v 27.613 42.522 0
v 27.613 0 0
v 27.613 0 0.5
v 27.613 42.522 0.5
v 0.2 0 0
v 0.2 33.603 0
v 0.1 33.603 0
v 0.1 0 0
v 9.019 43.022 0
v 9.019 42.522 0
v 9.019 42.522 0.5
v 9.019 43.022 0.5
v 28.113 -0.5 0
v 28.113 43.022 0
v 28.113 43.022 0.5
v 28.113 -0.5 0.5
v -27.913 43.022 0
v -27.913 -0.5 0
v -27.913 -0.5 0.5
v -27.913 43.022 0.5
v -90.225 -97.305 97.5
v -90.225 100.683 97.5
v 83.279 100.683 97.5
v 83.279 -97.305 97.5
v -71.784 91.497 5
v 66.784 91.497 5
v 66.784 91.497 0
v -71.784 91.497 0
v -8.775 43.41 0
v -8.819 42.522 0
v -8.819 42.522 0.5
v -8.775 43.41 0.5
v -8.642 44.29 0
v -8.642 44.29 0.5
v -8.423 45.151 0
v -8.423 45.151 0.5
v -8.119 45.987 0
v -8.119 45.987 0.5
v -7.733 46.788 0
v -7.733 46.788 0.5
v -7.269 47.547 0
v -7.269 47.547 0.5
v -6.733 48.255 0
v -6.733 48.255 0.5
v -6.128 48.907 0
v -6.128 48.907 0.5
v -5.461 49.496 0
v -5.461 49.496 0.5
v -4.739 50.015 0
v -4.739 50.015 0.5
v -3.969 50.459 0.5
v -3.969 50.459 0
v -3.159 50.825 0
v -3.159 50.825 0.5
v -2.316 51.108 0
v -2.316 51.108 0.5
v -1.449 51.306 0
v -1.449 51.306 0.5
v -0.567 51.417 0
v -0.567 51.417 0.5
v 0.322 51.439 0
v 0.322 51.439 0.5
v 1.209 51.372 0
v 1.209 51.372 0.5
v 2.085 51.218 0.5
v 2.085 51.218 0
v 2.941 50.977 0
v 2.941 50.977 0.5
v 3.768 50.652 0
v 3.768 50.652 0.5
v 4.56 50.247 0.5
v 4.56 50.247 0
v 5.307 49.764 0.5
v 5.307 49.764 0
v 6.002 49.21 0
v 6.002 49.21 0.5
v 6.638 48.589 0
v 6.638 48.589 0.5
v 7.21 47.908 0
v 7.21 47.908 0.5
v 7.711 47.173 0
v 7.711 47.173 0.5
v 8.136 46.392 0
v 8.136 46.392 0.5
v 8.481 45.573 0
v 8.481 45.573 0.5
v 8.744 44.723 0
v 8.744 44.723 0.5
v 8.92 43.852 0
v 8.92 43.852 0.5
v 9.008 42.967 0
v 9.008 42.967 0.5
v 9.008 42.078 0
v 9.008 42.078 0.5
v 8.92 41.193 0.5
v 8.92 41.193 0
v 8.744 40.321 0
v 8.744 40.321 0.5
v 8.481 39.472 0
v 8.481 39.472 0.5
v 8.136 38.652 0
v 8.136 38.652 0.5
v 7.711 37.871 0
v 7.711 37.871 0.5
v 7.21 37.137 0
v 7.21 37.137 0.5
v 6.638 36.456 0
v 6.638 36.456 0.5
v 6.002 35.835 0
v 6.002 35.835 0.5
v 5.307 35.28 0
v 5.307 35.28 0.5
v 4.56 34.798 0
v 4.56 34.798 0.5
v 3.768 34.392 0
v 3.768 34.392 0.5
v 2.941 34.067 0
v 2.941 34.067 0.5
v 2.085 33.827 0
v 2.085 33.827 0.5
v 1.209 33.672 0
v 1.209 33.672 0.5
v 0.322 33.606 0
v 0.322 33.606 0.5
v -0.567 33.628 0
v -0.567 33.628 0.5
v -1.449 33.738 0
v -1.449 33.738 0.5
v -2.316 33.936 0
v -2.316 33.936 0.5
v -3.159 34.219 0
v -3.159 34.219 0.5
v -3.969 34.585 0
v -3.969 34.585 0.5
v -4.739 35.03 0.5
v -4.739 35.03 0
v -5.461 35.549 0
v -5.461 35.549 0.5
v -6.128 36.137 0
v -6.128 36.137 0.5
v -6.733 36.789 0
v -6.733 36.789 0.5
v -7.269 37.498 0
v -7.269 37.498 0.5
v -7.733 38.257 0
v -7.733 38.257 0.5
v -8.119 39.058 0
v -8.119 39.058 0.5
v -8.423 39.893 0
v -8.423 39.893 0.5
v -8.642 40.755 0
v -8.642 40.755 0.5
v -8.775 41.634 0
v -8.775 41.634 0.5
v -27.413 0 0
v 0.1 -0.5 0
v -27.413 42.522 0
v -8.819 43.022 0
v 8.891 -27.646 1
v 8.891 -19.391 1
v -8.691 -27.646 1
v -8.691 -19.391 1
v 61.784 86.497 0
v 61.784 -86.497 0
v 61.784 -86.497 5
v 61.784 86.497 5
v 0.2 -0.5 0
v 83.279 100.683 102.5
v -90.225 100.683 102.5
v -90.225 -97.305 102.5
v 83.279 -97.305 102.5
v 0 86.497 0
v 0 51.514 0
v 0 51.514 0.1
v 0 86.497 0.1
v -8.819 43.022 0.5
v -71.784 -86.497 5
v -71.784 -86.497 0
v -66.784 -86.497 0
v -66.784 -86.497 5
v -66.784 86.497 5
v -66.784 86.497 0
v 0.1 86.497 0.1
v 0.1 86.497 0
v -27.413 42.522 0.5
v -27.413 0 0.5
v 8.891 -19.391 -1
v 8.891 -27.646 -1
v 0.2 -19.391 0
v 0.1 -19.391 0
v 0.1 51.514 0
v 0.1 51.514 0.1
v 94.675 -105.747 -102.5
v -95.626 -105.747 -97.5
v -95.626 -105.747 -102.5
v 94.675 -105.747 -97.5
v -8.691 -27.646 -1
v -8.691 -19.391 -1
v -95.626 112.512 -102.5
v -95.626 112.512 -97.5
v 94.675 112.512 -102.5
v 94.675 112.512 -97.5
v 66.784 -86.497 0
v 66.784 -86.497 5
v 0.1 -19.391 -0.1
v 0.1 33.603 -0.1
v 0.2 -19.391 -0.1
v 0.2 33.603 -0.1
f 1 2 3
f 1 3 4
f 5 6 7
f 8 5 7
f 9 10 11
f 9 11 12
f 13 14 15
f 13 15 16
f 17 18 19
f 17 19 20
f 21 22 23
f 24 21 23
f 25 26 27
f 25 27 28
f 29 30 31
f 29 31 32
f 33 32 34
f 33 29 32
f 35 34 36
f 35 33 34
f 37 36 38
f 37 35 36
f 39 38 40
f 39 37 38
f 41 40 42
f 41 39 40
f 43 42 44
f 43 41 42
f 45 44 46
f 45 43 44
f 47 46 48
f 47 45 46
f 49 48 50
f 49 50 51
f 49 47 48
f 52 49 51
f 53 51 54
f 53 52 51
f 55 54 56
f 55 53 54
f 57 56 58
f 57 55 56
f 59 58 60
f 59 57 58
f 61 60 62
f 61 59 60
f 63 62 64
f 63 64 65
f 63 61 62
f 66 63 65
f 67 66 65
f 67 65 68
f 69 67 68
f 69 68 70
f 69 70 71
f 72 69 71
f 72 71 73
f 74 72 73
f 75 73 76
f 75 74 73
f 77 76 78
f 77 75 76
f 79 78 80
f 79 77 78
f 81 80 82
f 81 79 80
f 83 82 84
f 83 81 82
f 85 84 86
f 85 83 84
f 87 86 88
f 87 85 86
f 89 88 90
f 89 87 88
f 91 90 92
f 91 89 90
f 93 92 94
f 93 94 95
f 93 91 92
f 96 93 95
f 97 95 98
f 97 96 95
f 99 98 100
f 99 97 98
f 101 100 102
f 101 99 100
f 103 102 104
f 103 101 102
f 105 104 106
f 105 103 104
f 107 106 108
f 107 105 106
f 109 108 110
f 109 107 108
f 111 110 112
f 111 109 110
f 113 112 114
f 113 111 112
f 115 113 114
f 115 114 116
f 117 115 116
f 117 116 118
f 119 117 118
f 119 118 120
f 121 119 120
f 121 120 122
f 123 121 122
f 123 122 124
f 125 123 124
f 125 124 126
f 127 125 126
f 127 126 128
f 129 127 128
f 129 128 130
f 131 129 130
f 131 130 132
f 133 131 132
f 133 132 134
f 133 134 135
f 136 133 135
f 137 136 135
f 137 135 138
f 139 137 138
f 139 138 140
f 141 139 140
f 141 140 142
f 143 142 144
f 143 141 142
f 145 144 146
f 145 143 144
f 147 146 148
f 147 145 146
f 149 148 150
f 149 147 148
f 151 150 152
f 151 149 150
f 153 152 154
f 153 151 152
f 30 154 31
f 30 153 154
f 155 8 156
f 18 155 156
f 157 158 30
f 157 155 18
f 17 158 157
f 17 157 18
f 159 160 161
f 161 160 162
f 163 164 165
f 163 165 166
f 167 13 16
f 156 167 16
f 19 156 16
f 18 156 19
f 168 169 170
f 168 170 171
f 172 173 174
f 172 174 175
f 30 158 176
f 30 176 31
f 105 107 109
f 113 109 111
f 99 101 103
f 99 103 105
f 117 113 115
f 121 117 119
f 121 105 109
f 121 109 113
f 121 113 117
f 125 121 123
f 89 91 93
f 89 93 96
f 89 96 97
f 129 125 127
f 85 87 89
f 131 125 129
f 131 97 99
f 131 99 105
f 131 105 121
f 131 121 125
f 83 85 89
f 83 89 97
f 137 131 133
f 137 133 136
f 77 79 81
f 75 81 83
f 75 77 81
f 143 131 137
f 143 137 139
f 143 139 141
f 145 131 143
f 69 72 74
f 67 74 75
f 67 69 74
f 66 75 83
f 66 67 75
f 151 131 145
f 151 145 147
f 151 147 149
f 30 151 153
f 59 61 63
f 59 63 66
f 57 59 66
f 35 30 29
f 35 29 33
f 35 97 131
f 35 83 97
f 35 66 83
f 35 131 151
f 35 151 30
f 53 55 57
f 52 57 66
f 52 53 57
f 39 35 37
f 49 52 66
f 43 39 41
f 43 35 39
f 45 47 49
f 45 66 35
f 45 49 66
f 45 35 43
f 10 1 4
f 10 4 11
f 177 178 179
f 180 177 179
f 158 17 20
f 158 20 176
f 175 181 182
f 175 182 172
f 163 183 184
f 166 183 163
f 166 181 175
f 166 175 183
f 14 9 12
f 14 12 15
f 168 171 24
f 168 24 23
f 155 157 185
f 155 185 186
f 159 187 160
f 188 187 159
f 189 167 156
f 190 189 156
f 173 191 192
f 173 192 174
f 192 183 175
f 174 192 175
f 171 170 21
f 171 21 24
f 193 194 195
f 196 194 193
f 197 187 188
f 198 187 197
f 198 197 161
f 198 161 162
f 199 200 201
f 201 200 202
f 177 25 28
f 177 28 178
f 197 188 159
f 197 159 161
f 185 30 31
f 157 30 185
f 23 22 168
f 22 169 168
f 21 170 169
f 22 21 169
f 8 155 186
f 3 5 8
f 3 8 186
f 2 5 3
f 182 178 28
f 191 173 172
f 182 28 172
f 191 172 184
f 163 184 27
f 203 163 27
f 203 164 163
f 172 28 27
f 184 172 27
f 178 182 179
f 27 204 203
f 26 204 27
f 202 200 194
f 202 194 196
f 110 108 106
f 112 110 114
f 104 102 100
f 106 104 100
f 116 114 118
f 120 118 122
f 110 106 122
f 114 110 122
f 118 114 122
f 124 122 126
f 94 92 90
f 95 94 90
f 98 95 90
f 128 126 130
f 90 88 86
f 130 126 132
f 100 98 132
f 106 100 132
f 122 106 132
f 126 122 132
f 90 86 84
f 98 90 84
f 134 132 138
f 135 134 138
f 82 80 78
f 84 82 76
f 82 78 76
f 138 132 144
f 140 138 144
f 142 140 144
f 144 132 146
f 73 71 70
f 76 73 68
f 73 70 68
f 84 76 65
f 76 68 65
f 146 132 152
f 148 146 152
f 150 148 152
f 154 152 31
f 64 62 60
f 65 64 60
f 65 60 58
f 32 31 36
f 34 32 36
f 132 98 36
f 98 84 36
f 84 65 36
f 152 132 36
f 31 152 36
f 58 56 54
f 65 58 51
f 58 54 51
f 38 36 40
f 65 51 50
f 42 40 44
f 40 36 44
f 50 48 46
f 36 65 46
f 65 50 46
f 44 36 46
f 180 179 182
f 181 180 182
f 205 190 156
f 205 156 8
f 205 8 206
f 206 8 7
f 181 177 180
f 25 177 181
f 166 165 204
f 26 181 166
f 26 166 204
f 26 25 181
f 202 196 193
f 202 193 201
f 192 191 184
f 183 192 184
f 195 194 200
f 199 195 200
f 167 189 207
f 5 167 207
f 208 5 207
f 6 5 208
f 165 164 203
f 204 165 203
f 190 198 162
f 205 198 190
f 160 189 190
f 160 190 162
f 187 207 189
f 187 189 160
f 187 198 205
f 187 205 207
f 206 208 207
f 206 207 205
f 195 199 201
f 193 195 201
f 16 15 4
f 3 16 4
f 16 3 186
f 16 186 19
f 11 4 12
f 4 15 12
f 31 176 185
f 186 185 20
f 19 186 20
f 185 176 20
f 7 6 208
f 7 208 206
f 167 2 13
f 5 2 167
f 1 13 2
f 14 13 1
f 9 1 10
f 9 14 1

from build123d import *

# Parameters (mm, degrees)
SKETCH_1_W        = 5
SKETCH_1_H        = 172.993722334
EXTRUDE_1_DEPTH   = 5
EXTRUDE_1_2_DEPTH = 5
EXTRUDE_2_DEPTH   = 5
SKETCH_3_W        = 0.1
SKETCH_3_H        = 34.98253205
EXTRUDE_3_DEPTH   = 0.1
SKETCH_5_R        = 8.919313786
EXTRUDE_1_3_DEPTH = 0.5
EXTRUDE_4_DEPTH   = 0.5
SKETCH_7_W        = 0.1
SKETCH_7_H        = 52.993522993
EXTRUDE_6_DEPTH   = 0.1
EXTRUDE_3_2_DEPTH = 1
SKETCH_9_W        = 173.503354497
SKETCH_9_H        = 197.988407328
EXTRUDE_4_2_DEPTH = 2.5
SKETCH_11_W       = 190.301069936
SKETCH_11_H       = 218.259854491
EXTRUDE_5_DEPTH   = 2.5


with BuildPart() as part:
    # 草图1 → Extrude 1 (new body)
    with BuildSketch(Plane.XY):
        with Locations((-69.283623041, 0)):
            Rectangle(SKETCH_1_W, SKETCH_1_H)
    extrude(amount=EXTRUDE_1_DEPTH)



with BuildPart() as body_2:
    # 草图1 → Extrude 1 2 (new body)
    with BuildSketch(Plane.XY):
        with Locations((64.283623041, 0)):
            Rectangle(SKETCH_1_W, SKETCH_1_H)
    extrude(amount=EXTRUDE_1_2_DEPTH)


with BuildPart() as part_1:
    add(part.part)

    add(body_2.part)  # 拉伸-薄壁2 merges body 2
    # 草图2 → 拉伸-薄壁2 (add)
    with BuildSketch(Plane.XY.offset(5)):
        Polygon((-71.783623041, 86.496861167), (-69.283623041, 86.496861167), (64.283623041, 86.496861167), (66.783623041, 86.496861167), (66.783623041, 91.496861167), (64.283623041, 91.496861167), (-69.283623041, 91.496861167), (-71.783623041, 91.496861167), align=None)
    extrude(amount=-EXTRUDE_2_DEPTH)

    # 草图3 → Extrude 3 (add)
    with BuildSketch(Plane(origin=(0, 0, 0), x_dir=(-1, 0, 0), z_dir=(0, 0, -1))):
        with Locations((-0.05, 69.005595142)):
            Rectangle(SKETCH_3_W, SKETCH_3_H)
    extrude(amount=-EXTRUDE_3_DEPTH)


with BuildPart() as body_2_2:
    # 草图5 → Extrude 1 3 (new body)
    with BuildSketch(Plane(origin=(0, 0, 0), x_dir=(-1, 0, 0), z_dir=(0, 0, -1))):
        with Locations((-0.1, 42.522226632)):
            Circle(SKETCH_5_R)
    extrude(amount=-EXTRUDE_1_3_DEPTH)


with BuildPart() as body_3:
    # 草图6 → Extrude 4 (new body)
    with BuildSketch(Plane(origin=(0, 0, 0), x_dir=(-1, 0, 0), z_dir=(0, 0, -1))):
        Polygon((8.819313786, 42.522226632), (27.412546228, 42.522226632), (27.412546228, 0), (-27.612546228, 0), (-27.612546228, 42.522226632), (-9.019313786, 42.522226632), (-9.019313786, 43.022226632), (-28.112546228, 43.022226632), (-28.112546228, -0.5), (27.912546228, -0.5), (27.912546228, 43.022226632), (8.819313786, 43.022226632), align=None)
    extrude(amount=-EXTRUDE_4_DEPTH)

    # 草图7 → 拉伸-薄壁6 (add)
    with BuildSketch(Plane(origin=(0, 0, 0), x_dir=(-1, 0, 0), z_dir=(0, 0, -1))):
        with Locations((-0.15, 7.10615135)):
            Rectangle(SKETCH_7_W, SKETCH_7_H)
    extrude(amount=EXTRUDE_6_DEPTH)

    # 草图8 → Extrude 3 2 (add, symmetric)
    with BuildSketch(Plane(origin=(0, 0, 0), x_dir=(-1, 0, 0), z_dir=(0, 0, -1))):
        Polygon((0, -19.390610147), (-0.2, -19.390610147), (-8.891283678, -19.390610147), (-8.891283678, -27.645655051), (8.691283678, -27.645655051), (8.691283678, -19.390610147), align=None)
    extrude(amount=EXTRUDE_3_2_DEPTH, both=True)


with BuildPart() as body_4:
    # 草图9 → Extrude 4 2 (new, symmetric)
    with BuildSketch(Plane.XY.offset(100)):
        with Locations((-3.472916007, 1.689236661)):
            Rectangle(SKETCH_9_W, SKETCH_9_H)
    extrude(amount=EXTRUDE_4_2_DEPTH, both=True)


with BuildPart() as body_5:
    # 草图11 → 凸台-拉伸5 (new, symmetric)
    with BuildSketch(Plane.XY.offset(-100)):
        with Locations((-0.475210299, 3.382475522)):
            Rectangle(SKETCH_11_W, SKETCH_11_H)
    extrude(amount=EXTRUDE_5_DEPTH, both=True)


solid = Compound([part_1.part, body_2_2.part, body_3.part, body_4.part, body_5.part])
